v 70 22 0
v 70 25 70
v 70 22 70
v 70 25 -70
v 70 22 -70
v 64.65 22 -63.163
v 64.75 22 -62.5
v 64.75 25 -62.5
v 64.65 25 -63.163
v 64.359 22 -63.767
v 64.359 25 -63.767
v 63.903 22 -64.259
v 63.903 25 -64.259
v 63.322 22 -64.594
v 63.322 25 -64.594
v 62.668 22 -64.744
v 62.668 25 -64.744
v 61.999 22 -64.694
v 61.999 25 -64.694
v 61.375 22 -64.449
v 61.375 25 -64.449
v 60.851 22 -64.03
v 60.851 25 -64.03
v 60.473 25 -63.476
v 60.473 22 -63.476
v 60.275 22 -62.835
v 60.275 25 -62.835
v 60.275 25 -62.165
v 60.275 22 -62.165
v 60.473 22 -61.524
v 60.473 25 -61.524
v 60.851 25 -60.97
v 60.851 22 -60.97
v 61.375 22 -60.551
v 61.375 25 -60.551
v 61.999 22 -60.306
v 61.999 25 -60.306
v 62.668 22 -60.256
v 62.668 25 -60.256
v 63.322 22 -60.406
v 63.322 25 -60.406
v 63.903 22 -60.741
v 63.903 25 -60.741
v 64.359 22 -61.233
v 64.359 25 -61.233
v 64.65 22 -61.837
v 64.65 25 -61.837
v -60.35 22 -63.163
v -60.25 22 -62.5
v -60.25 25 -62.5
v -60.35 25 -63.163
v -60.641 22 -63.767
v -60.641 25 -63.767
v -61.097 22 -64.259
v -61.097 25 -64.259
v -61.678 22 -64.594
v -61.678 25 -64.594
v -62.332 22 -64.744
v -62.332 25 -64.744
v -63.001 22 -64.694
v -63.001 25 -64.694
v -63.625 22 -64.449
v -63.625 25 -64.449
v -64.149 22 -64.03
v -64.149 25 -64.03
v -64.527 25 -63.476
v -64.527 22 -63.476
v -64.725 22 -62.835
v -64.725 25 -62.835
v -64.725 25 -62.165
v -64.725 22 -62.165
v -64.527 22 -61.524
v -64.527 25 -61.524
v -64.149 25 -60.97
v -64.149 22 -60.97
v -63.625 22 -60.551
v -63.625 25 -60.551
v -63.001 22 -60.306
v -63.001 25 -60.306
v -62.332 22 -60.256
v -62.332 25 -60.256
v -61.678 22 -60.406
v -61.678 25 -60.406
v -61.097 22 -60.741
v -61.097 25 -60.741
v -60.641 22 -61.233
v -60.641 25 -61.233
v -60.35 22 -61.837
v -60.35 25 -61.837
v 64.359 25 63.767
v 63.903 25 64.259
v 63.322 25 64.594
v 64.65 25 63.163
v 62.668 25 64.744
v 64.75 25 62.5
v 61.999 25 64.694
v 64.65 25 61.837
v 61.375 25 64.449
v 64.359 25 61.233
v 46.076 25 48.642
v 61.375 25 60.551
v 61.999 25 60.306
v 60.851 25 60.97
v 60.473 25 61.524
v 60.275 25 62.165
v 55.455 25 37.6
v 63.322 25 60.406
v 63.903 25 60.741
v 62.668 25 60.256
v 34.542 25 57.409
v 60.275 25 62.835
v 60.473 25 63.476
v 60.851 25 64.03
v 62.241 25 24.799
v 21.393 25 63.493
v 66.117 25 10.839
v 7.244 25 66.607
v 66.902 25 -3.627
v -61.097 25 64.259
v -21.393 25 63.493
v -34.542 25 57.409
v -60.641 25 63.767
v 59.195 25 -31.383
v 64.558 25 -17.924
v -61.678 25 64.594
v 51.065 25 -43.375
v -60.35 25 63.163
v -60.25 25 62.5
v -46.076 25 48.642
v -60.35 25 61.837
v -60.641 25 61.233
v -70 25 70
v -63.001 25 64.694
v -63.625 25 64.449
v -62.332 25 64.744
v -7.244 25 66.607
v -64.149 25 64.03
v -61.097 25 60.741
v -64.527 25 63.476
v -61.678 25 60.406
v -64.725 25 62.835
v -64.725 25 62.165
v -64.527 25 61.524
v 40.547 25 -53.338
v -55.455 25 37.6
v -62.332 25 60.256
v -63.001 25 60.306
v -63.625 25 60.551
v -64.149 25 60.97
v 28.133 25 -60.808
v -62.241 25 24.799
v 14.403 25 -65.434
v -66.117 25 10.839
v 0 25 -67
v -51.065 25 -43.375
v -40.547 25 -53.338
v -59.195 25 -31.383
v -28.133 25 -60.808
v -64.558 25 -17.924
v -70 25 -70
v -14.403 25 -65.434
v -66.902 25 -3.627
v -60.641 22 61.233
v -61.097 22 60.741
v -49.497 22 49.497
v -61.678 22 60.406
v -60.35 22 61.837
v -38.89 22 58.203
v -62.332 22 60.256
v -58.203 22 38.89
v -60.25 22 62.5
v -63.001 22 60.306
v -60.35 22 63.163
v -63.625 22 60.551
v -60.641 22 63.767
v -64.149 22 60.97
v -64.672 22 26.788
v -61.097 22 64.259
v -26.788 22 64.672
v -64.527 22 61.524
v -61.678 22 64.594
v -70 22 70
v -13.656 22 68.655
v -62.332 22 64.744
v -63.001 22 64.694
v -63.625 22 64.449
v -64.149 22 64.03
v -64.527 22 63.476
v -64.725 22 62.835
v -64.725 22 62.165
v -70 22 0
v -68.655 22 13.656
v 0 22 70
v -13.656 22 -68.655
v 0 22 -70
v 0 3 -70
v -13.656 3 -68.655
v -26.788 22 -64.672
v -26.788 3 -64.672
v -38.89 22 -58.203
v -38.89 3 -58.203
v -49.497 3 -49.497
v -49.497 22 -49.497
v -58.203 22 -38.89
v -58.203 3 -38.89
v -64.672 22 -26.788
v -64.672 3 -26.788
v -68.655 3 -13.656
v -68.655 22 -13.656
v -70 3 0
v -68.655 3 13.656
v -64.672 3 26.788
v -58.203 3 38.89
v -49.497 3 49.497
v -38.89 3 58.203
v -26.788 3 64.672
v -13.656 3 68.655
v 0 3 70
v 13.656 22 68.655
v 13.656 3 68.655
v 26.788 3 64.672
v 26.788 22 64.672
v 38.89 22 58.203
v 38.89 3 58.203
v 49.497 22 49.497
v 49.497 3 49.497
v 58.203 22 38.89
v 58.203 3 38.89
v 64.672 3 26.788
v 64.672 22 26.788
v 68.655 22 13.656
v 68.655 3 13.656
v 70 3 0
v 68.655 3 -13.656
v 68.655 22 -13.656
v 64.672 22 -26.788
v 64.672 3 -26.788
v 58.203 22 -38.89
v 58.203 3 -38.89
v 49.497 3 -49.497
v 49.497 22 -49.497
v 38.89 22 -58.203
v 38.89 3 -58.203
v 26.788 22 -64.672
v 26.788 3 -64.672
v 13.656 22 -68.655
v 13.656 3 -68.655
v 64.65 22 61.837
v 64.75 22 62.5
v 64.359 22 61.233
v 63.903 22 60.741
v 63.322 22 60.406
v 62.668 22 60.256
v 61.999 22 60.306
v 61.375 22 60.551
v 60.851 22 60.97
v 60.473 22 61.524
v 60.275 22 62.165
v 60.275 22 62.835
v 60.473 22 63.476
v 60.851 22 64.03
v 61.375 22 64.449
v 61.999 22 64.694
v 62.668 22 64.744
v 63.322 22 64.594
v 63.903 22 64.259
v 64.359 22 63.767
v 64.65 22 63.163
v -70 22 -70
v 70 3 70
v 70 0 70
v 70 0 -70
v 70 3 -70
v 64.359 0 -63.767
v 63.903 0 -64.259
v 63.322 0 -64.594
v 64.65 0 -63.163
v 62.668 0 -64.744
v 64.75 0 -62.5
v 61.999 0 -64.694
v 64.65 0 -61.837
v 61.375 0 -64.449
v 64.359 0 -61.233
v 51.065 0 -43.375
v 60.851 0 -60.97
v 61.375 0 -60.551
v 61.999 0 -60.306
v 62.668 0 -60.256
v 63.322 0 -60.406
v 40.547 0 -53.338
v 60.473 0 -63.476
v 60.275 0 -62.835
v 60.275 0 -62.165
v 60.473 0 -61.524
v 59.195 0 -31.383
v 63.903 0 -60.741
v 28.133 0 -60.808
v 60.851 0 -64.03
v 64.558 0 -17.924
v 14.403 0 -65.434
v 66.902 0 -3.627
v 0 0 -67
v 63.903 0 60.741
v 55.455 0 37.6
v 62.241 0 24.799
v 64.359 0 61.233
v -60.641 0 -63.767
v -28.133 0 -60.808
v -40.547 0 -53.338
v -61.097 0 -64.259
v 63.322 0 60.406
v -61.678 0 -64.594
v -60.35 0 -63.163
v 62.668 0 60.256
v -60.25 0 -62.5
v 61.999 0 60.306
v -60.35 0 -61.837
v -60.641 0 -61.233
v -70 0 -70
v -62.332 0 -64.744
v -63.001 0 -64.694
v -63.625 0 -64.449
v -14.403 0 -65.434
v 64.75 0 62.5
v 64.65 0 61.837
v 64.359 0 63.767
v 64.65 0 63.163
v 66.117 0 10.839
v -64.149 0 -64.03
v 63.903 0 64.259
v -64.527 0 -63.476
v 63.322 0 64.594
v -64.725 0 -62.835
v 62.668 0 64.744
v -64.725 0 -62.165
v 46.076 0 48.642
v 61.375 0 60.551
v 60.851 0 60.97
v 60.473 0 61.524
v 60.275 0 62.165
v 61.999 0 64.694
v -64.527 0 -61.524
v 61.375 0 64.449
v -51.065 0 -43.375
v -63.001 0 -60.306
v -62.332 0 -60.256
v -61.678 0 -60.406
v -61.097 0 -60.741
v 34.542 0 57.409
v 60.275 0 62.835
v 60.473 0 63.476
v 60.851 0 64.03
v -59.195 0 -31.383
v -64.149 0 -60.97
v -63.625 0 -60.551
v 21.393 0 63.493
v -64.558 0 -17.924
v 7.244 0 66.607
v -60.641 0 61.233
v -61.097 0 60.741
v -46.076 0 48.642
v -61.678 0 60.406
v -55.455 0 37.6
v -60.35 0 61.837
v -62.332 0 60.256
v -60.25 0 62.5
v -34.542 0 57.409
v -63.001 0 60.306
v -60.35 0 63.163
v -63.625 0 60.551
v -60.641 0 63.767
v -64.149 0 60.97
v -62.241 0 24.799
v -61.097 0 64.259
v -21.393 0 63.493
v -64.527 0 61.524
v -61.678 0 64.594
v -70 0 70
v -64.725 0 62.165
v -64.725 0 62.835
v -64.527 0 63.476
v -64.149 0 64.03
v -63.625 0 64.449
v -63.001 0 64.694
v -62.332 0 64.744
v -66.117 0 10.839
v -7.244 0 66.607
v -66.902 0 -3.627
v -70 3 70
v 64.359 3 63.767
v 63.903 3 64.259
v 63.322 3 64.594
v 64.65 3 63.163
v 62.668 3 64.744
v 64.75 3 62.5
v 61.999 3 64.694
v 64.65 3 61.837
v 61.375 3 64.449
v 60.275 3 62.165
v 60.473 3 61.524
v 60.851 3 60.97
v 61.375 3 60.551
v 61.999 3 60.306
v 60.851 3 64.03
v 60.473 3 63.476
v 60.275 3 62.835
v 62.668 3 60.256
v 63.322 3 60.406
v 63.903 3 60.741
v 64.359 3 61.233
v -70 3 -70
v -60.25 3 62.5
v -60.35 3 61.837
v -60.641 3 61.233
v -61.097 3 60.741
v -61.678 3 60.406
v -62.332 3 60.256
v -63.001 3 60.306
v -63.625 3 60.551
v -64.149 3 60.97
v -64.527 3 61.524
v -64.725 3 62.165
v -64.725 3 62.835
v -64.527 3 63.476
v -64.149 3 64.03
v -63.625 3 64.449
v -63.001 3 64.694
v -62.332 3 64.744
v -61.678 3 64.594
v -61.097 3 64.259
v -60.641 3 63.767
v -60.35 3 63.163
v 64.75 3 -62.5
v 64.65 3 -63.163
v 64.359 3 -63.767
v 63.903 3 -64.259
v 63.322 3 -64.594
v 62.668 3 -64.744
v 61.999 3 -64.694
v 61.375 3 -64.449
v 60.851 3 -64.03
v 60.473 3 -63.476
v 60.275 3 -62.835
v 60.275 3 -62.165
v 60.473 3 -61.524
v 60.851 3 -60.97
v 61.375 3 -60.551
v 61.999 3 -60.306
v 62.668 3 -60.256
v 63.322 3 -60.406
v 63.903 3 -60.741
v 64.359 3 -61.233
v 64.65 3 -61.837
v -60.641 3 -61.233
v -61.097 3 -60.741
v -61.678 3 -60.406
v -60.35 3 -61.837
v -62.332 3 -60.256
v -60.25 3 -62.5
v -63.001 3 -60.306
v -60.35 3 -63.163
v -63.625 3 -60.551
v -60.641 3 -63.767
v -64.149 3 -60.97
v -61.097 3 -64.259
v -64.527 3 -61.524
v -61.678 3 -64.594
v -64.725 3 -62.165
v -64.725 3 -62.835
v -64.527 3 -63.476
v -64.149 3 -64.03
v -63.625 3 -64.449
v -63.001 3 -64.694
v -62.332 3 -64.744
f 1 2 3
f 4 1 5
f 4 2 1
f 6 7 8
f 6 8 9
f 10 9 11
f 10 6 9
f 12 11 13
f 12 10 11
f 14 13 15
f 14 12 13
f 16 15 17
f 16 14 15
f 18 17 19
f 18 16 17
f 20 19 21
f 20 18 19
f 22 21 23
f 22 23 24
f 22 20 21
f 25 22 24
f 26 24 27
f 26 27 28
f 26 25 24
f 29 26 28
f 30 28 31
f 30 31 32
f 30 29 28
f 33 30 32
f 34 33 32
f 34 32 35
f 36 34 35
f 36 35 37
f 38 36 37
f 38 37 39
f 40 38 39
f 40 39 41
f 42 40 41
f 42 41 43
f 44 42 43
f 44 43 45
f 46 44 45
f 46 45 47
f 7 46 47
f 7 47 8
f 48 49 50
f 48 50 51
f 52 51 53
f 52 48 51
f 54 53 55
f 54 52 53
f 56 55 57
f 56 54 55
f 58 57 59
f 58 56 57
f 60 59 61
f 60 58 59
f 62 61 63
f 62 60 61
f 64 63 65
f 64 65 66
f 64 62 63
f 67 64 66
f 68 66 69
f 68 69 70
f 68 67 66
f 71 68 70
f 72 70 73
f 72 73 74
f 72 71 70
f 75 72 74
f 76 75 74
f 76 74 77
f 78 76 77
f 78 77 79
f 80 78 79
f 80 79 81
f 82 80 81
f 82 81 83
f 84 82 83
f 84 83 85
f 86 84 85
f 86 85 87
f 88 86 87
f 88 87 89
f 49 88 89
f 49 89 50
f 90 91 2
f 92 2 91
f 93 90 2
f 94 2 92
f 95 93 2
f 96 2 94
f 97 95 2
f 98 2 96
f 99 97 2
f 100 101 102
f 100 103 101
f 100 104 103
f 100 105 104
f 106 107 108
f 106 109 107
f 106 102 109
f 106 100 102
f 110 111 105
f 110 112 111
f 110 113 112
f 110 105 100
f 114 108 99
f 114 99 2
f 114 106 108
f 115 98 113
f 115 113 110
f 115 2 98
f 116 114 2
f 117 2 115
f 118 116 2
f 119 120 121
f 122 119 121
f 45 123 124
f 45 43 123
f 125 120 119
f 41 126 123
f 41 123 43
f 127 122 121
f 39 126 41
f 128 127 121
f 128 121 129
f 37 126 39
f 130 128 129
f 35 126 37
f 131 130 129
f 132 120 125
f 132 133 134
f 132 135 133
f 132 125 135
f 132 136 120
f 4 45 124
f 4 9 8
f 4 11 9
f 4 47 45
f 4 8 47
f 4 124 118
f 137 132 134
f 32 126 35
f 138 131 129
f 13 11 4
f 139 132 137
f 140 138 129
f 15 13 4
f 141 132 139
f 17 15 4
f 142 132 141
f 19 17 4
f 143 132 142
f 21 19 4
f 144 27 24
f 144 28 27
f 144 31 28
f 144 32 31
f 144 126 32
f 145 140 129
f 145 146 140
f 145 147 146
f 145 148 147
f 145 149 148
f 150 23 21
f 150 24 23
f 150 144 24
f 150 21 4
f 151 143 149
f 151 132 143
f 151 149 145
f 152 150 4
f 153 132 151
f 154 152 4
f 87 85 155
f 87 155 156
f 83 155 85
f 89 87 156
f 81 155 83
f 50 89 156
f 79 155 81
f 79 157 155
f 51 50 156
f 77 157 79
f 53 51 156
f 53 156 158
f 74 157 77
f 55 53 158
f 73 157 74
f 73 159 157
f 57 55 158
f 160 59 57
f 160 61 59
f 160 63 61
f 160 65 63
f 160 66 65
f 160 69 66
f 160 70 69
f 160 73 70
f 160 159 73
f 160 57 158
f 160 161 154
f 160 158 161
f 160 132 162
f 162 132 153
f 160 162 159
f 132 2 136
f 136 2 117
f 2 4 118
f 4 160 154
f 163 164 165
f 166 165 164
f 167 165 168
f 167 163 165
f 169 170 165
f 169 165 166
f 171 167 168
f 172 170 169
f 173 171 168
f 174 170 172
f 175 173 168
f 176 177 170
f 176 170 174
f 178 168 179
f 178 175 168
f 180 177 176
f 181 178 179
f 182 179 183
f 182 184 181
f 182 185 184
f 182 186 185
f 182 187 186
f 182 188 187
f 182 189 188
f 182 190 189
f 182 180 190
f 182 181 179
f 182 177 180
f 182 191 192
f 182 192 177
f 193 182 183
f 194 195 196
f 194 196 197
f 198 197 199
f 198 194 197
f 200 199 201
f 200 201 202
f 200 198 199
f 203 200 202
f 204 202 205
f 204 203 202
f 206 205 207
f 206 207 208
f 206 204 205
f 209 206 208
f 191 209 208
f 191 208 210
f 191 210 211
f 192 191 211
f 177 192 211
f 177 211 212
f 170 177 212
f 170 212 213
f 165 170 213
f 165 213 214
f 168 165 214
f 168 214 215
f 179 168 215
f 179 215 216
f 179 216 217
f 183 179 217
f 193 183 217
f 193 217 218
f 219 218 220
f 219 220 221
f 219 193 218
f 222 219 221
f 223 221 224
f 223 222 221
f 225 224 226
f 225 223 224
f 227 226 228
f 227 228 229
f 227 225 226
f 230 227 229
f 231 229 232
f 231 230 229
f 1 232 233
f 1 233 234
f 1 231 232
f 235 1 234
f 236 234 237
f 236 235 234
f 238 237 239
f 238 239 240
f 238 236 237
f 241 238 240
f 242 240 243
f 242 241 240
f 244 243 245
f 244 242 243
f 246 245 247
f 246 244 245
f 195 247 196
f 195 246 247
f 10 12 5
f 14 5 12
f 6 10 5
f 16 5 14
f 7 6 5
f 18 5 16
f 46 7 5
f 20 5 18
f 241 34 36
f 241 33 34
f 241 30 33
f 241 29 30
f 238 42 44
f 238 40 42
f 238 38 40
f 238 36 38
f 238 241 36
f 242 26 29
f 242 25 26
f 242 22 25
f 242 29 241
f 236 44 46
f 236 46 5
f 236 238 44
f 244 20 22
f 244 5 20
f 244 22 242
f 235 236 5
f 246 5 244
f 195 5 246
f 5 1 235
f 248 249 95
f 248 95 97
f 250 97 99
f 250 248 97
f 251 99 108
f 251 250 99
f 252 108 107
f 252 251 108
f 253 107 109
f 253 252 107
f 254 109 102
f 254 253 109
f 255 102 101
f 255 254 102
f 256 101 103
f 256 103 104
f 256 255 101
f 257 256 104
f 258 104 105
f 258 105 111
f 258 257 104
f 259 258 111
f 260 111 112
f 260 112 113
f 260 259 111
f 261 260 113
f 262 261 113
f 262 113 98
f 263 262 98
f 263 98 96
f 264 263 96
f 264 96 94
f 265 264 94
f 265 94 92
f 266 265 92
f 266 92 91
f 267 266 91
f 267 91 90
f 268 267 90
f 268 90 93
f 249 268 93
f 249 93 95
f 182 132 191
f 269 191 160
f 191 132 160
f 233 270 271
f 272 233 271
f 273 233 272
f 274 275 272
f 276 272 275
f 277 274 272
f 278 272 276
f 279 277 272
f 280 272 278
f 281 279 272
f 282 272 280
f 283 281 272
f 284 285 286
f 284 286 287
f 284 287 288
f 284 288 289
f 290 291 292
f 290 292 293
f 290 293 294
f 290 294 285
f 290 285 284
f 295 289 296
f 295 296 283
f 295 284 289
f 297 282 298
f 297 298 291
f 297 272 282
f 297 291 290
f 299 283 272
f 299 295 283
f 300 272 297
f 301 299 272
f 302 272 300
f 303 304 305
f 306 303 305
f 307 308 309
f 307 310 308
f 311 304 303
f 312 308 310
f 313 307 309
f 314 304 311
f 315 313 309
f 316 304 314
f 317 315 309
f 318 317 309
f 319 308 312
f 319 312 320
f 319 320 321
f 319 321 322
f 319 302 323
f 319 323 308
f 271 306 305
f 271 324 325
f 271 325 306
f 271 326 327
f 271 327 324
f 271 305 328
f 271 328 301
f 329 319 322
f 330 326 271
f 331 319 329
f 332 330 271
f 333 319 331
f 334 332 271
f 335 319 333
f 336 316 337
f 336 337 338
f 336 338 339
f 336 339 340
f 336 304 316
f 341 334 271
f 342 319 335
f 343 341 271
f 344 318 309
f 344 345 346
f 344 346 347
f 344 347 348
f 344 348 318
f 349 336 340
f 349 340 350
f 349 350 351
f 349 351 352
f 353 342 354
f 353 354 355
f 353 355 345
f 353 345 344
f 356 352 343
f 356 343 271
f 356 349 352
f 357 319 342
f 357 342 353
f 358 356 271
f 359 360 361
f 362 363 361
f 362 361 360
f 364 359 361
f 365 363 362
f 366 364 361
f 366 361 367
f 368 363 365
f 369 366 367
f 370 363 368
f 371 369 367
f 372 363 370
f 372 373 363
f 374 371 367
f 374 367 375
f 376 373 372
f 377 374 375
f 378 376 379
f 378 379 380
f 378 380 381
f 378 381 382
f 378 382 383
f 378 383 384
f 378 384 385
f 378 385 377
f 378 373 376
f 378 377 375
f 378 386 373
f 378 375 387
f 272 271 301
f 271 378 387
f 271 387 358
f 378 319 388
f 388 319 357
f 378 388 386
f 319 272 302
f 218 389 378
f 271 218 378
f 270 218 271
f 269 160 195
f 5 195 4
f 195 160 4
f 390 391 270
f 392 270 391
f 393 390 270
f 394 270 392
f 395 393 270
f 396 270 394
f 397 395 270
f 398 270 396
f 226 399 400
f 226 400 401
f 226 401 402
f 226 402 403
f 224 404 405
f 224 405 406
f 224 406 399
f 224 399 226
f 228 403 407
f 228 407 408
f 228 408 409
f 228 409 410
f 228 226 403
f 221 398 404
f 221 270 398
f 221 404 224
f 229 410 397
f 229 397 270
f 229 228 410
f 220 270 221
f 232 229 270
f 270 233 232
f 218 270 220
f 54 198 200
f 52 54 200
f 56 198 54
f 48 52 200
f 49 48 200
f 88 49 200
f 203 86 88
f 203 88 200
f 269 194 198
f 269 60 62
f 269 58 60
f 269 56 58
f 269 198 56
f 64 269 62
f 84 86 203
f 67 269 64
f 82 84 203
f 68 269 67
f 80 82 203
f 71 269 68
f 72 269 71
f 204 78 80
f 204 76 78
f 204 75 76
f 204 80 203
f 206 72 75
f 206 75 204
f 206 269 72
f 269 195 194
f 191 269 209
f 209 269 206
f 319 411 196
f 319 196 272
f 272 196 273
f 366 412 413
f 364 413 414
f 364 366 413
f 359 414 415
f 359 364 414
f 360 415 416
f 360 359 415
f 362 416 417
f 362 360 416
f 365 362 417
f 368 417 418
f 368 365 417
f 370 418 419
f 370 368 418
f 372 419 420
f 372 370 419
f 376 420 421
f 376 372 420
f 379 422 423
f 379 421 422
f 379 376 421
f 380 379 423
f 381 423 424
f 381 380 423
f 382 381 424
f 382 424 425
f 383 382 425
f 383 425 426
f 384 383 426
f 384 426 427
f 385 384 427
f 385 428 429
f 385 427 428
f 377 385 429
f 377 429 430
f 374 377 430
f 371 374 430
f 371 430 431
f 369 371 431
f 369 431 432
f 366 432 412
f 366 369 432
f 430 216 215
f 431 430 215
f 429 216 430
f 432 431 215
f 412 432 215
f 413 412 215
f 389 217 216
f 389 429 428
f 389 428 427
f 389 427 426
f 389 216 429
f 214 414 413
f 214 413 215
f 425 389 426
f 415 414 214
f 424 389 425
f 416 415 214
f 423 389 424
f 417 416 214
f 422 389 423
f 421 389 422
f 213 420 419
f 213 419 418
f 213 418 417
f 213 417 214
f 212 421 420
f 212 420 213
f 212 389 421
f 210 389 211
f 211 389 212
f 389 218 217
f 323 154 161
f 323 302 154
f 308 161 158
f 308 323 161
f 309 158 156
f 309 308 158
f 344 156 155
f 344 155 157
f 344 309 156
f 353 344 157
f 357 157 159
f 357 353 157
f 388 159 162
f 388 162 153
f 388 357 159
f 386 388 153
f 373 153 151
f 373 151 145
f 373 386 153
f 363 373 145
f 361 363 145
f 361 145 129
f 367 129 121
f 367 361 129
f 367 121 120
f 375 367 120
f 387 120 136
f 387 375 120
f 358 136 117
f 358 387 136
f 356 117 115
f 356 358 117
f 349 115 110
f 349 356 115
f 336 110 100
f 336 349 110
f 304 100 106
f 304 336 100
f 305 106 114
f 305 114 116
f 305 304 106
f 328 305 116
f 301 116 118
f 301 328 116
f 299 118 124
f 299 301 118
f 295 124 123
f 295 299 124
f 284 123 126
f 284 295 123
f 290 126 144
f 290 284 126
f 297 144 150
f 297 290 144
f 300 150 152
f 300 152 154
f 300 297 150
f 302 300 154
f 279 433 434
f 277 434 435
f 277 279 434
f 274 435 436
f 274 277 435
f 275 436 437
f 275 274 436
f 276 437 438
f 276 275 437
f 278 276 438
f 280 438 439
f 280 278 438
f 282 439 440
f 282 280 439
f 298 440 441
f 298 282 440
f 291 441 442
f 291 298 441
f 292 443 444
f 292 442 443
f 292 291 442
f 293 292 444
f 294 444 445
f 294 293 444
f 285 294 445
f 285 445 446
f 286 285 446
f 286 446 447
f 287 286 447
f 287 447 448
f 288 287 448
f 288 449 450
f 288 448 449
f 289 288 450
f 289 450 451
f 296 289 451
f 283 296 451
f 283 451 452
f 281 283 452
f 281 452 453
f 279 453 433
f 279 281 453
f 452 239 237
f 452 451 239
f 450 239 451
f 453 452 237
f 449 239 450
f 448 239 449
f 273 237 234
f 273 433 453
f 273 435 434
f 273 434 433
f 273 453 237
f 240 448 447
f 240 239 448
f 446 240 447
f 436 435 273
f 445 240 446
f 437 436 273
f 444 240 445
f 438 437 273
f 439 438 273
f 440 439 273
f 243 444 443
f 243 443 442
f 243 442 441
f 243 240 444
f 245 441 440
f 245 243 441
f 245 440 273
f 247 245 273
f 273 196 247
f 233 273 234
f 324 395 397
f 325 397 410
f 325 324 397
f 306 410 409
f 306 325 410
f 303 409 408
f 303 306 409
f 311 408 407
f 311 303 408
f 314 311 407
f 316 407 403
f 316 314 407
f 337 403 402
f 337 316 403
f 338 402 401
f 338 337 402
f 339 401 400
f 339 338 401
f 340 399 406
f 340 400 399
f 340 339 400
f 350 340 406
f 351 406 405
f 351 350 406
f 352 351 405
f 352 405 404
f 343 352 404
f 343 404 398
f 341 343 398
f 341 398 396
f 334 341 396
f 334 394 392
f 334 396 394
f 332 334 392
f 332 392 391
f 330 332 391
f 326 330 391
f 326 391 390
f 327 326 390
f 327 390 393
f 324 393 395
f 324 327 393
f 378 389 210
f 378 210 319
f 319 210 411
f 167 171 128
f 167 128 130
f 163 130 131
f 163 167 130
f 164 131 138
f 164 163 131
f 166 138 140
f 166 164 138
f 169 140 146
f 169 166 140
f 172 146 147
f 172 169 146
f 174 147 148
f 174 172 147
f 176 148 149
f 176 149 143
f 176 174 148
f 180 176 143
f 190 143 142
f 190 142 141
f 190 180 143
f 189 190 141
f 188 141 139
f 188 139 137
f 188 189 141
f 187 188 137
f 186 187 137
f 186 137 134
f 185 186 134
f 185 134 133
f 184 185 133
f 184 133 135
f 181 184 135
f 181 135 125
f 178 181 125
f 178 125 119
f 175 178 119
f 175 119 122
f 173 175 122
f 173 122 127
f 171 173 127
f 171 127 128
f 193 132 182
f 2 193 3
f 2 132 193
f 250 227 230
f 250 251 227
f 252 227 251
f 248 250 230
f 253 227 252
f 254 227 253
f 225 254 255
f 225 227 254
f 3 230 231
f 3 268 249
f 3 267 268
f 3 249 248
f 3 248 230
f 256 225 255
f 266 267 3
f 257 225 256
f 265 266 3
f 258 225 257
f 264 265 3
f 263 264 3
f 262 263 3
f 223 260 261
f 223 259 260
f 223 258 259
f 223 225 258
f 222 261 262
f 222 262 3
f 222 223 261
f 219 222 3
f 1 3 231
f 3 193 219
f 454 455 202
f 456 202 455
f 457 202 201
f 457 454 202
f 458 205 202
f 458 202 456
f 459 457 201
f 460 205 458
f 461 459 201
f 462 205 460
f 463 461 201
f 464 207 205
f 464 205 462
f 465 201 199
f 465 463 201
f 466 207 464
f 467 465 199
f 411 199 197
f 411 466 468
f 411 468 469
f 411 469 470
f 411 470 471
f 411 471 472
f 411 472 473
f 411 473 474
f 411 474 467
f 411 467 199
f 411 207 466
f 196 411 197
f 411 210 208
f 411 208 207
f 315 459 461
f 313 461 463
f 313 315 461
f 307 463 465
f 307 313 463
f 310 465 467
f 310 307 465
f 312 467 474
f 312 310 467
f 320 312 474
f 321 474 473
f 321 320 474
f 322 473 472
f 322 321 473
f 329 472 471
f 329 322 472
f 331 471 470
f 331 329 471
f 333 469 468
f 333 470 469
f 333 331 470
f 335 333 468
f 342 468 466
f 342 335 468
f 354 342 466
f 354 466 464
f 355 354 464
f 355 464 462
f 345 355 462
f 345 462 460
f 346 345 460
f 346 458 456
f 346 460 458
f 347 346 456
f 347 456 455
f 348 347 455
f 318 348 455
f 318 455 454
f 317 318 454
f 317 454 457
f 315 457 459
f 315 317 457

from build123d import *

# Parameters (mm, degrees)
SKETCH2_OUTSIDE_W            = 258.79
SKETCH2_OUTSIDE_H            = 258.79
SKETCH2_OUTSIDE_W_2          = 140
SKETCH2_OUTSIDE_H_2          = 140
SQUARE_SHAPE_CUTOUT_DEPTH    = 144.614066163
M4_CLEARANCE_HOLE1_OUTLINE_R = 2.25
M4_CLEARANCE_HOLE1_DEPTH     = 25


# Read off the part's stored shape, not the designer's step: M4 Clearance Hole1
with BuildPart() as part:
    # Sketch1 → body (revolve)
    with BuildSketch(Plane.XY, mode=Mode.PRIVATE) as body_sk:
        Polygon((67, 0), (100, 0), (100, 3), (70, 3), (70, 22), (100, 22), (100, 25), (67, 25), align=None)
    revolve(body_sk.sketch.rotate(Axis((0, 0, 0), (0, 1, 0)), 90), axis=Axis((0, 0, 0), (0, 1, 0)))

    # Sketch2 outside → square_shape_cutout (cut, through all)
    with BuildSketch(Plane(origin=(0, 25, 0), x_dir=(1, 0, 0), z_dir=(0, 1, 0))):
        Rectangle(SKETCH2_OUTSIDE_W, SKETCH2_OUTSIDE_H)
        Rectangle(SKETCH2_OUTSIDE_W_2, SKETCH2_OUTSIDE_H_2, mode=Mode.SUBTRACT)
    extrude(amount=-SQUARE_SHAPE_CUTOUT_DEPTH, mode=Mode.SUBTRACT)

    # M4 Clearance Hole1 outline → M4 Clearance Hole1 (cut)
    with BuildSketch(Plane(origin=(0, 0, 0), x_dir=(1, 0, 0), z_dir=(0, 1, 0))):
        with Locations((62.5, 62.5)):
            Circle(M4_CLEARANCE_HOLE1_OUTLINE_R)
        with Locations((-62.5, -62.5)):
            Circle(M4_CLEARANCE_HOLE1_OUTLINE_R)
        with Locations((62.5, -62.5)):
            Circle(M4_CLEARANCE_HOLE1_OUTLINE_R)
        with Locations((-62.5, 62.5)):
            Circle(M4_CLEARANCE_HOLE1_OUTLINE_R)
    extrude(amount=M4_CLEARANCE_HOLE1_DEPTH, mode=Mode.SUBTRACT)


solid = part.part
